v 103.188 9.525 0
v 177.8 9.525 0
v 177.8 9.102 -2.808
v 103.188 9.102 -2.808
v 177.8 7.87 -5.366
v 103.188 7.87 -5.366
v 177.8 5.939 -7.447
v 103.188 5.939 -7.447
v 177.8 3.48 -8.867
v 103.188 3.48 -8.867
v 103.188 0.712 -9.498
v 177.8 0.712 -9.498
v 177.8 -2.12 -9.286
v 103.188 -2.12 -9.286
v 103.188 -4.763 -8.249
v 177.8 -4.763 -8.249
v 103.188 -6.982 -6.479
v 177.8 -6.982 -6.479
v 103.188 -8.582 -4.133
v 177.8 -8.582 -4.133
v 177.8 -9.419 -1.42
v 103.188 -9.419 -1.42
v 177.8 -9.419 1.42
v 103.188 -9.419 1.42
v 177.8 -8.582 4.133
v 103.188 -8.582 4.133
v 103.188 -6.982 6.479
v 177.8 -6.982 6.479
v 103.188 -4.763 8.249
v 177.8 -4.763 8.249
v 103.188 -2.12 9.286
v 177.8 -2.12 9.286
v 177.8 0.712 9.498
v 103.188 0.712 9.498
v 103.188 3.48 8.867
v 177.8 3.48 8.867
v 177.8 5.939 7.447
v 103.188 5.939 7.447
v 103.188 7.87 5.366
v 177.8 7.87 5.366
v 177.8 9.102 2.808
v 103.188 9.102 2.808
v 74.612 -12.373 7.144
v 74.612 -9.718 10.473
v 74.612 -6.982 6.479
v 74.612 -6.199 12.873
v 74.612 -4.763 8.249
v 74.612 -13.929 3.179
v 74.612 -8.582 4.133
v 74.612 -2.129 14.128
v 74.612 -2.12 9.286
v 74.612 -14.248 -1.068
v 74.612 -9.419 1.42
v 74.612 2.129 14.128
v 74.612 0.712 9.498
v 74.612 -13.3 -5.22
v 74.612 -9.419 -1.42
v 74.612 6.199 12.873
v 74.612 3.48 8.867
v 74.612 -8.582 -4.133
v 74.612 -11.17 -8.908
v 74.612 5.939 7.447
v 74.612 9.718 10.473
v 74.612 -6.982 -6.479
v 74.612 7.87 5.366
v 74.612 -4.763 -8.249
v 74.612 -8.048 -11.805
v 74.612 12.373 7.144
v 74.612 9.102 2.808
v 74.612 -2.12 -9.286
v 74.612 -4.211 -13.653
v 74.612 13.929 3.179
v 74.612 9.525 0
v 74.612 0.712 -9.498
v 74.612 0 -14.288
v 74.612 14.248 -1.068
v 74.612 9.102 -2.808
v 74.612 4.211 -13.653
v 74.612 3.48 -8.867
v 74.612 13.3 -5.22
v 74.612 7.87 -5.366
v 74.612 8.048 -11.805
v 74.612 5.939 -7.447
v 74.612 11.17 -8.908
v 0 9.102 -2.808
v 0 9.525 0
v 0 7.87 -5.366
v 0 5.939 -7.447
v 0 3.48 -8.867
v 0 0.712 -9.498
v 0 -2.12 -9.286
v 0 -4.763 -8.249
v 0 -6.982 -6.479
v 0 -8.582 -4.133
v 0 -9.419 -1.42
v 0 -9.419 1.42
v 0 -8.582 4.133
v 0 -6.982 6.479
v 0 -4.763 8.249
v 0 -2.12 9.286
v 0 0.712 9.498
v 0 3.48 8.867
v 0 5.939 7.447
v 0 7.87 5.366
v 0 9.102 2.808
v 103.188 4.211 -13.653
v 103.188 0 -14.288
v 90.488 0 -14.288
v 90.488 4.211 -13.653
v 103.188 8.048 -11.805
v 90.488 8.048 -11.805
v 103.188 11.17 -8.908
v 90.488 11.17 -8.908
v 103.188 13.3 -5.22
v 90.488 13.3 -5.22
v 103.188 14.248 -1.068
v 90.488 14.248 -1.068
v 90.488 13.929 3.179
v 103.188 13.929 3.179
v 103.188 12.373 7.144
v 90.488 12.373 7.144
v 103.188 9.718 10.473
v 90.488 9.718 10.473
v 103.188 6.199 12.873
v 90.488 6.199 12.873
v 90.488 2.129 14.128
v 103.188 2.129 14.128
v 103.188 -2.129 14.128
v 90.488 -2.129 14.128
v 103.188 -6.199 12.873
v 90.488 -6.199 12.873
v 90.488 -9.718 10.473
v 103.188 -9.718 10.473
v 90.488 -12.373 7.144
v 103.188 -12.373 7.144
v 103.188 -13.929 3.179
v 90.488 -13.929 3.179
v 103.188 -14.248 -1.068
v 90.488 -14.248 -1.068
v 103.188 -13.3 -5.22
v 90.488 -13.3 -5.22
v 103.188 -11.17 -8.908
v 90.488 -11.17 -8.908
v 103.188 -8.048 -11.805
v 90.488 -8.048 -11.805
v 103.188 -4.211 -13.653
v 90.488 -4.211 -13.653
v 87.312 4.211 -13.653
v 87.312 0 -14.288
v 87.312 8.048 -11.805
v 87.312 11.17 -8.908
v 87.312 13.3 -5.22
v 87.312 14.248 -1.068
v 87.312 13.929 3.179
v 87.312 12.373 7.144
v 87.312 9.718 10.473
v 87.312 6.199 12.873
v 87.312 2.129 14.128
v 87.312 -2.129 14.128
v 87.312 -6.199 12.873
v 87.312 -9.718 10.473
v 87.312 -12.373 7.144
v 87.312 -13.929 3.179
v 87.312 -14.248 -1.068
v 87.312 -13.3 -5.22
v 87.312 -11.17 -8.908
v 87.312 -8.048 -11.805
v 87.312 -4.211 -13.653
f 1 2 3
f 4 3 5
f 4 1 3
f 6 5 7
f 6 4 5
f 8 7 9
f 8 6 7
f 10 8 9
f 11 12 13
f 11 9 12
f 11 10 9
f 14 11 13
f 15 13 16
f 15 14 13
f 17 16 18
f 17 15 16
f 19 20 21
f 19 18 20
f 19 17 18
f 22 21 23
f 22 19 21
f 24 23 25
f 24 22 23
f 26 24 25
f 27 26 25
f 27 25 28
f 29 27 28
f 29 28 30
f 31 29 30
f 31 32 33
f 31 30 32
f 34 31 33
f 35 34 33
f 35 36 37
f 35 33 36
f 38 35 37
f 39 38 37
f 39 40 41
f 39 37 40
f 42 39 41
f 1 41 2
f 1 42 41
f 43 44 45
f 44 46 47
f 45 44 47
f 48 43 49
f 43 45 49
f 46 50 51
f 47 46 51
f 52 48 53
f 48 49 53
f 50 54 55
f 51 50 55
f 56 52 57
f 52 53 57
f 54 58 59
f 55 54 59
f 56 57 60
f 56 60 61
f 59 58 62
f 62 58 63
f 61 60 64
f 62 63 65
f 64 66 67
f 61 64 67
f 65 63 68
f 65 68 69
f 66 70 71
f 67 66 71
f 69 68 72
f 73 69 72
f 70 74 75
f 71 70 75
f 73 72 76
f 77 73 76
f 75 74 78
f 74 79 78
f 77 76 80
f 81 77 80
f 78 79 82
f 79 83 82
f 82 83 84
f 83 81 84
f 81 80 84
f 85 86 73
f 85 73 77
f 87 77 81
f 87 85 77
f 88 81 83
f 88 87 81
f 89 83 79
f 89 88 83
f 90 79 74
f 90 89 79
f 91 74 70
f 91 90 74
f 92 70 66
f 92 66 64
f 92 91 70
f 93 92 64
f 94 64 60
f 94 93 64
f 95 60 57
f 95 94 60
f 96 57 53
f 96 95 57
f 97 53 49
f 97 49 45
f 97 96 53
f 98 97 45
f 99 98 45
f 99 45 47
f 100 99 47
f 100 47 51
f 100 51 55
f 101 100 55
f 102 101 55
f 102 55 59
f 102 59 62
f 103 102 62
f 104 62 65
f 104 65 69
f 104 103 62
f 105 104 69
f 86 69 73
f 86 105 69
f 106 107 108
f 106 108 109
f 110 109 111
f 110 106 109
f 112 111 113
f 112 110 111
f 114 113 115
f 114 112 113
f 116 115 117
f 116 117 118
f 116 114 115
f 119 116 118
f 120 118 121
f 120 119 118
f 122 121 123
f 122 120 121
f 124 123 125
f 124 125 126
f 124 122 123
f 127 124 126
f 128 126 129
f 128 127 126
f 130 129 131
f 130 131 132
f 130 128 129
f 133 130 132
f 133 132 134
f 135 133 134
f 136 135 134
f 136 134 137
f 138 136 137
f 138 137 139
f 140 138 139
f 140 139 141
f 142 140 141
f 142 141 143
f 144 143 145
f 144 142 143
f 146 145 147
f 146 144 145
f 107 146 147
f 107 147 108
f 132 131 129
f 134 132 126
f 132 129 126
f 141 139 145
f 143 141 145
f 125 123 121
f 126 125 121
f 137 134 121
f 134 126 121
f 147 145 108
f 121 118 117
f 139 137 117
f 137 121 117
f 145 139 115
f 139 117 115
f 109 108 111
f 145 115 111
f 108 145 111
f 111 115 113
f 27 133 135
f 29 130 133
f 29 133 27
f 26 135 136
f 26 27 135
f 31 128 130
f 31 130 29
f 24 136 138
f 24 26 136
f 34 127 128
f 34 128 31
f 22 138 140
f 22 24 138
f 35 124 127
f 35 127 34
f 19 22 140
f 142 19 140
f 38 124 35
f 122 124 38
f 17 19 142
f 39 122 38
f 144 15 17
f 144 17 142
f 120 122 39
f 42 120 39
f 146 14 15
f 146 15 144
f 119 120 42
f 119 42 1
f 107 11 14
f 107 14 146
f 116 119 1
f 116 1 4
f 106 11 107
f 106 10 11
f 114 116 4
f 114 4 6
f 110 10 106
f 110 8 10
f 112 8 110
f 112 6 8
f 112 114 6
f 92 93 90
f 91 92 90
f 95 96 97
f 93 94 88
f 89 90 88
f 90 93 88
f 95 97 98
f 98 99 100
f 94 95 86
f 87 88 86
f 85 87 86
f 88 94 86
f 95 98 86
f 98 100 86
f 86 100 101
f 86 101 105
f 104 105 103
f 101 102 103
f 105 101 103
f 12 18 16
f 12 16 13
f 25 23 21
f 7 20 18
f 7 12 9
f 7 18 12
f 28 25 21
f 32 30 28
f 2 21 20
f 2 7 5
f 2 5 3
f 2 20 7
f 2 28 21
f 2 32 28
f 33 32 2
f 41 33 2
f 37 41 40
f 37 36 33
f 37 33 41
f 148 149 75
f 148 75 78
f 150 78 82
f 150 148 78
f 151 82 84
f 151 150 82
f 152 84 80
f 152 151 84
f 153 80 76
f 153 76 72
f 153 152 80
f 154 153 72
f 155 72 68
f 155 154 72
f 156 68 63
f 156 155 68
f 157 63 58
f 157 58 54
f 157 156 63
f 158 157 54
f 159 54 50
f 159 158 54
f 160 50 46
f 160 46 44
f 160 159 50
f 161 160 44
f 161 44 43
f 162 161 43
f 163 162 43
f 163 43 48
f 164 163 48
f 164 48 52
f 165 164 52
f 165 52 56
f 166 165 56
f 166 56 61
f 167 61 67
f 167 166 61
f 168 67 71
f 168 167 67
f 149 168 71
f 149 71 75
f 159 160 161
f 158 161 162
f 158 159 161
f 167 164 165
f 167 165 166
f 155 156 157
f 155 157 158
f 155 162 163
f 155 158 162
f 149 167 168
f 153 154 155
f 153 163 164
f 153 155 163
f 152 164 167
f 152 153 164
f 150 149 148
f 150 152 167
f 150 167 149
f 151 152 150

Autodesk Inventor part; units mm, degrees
sketch "Sketch1" plane through (0, 0, 0) normal (1, 0, 0) x (0, 1, 0)
  circle A0 centre (0, 0) radius 9.525
  dimension "d0" = 19.05
extrude "Extrusion1" add sketch "Sketch1" along normal blind 177.8
sketch "Sketch2" plane through (0, 0, 0) normal (0, 0, 1) x (1, 0, 0)
  line L0 (0, 9.525) -> (0, -9.525) projected
  line L1 (177.8, -9.525) -> (177.8, 9.525) projected
  line L2 (177.8, 0) -> (203.2, 0)
  line L3 (191.0369, -3.6537) -> (215.3631, 3.6537)
  line L4 (0, 0) -> (-25.4, 0)
  line L5 (-37.5631, 3.6537) -> (-13.2369, -3.6537)
  line L6 (-37.5631, 3.6537) -> (215.3631, 3.6537) construction
  line L7 (191.0369, -3.6537) -> (-13.2369, -3.6537) construction
  dimension "d3" = 25.4
  dimension "d4" = 16.72
ref_plane "Work Plane1" through (88.9, 0, 0) normal (1, 0, 0) x (0, 0, -1)
sketch "Sketch4" plane through (88.9, 0, 0) normal (1, 0, 0) x (0, 0, -1)
  circle A0 centre (0, 0) radius 14.2875
  dimension "d5" = 28.575
extrude "Extrusion2" add sketch "Sketch4" along normal mid plane 28.575
sketch "Sketch5" plane through (88.9, 0, 0) normal (1, 0, 0) x (0, 0, -1)
  circle A0 centre (0, 0) radius 14.2875
extrude "Extrusion3" cut sketch "Sketch5" along normal mid plane 3.175
sketch "Sketch6" plane through (0, 0, 0) normal (0, 1, 0) x (-1, 0, 0)
  line L0 (25.4, 0) -> (25.4, -14.6229)
  line L1 (-203.2, 0) -> (-203.2, -14.6229)
  point P0 (0, 0)
ref_plane "Work Plane2" through (203.2, 0, -14.6229) normal (-0.2877, 0.9577, 0) x (0, 0, 1)
sketch "Sketch7" plane through (203.2, 0, -14.6229) normal (-0.2877, 0.9577, 0) x (0, 0, 1)
  line L0 (9.6135, 0) -> (20.0925, 0)
  point P0 (14.6229, -194.6091)
  point P1 (14.6229, 0)
ref_plane "Work Plane4" through (-37.5631, 3.6537, 0) normal (0.2877, 0.9577, 0) x (0.9577, -0.2877, 0)
sketch "Sketch8" plane through (-37.5631, 3.6537, 0) normal (0.2877, 0.9577, 0) x (0.9577, -0.2877, 0)
  line L0 (12.7, 14.543) -> (12.7, -14.441)
  point P0 (37.0261, 0)
  point P1 (12.7, 0)
sketch "Sketch9" plane through (88.9, 0, 0) normal (1, 0, 0) x (0, 0, -1)
  line L0 (0, 18.8045) -> (0, -31.5137)
  point P0 (0, 0)
properties part number "Top Axle"
